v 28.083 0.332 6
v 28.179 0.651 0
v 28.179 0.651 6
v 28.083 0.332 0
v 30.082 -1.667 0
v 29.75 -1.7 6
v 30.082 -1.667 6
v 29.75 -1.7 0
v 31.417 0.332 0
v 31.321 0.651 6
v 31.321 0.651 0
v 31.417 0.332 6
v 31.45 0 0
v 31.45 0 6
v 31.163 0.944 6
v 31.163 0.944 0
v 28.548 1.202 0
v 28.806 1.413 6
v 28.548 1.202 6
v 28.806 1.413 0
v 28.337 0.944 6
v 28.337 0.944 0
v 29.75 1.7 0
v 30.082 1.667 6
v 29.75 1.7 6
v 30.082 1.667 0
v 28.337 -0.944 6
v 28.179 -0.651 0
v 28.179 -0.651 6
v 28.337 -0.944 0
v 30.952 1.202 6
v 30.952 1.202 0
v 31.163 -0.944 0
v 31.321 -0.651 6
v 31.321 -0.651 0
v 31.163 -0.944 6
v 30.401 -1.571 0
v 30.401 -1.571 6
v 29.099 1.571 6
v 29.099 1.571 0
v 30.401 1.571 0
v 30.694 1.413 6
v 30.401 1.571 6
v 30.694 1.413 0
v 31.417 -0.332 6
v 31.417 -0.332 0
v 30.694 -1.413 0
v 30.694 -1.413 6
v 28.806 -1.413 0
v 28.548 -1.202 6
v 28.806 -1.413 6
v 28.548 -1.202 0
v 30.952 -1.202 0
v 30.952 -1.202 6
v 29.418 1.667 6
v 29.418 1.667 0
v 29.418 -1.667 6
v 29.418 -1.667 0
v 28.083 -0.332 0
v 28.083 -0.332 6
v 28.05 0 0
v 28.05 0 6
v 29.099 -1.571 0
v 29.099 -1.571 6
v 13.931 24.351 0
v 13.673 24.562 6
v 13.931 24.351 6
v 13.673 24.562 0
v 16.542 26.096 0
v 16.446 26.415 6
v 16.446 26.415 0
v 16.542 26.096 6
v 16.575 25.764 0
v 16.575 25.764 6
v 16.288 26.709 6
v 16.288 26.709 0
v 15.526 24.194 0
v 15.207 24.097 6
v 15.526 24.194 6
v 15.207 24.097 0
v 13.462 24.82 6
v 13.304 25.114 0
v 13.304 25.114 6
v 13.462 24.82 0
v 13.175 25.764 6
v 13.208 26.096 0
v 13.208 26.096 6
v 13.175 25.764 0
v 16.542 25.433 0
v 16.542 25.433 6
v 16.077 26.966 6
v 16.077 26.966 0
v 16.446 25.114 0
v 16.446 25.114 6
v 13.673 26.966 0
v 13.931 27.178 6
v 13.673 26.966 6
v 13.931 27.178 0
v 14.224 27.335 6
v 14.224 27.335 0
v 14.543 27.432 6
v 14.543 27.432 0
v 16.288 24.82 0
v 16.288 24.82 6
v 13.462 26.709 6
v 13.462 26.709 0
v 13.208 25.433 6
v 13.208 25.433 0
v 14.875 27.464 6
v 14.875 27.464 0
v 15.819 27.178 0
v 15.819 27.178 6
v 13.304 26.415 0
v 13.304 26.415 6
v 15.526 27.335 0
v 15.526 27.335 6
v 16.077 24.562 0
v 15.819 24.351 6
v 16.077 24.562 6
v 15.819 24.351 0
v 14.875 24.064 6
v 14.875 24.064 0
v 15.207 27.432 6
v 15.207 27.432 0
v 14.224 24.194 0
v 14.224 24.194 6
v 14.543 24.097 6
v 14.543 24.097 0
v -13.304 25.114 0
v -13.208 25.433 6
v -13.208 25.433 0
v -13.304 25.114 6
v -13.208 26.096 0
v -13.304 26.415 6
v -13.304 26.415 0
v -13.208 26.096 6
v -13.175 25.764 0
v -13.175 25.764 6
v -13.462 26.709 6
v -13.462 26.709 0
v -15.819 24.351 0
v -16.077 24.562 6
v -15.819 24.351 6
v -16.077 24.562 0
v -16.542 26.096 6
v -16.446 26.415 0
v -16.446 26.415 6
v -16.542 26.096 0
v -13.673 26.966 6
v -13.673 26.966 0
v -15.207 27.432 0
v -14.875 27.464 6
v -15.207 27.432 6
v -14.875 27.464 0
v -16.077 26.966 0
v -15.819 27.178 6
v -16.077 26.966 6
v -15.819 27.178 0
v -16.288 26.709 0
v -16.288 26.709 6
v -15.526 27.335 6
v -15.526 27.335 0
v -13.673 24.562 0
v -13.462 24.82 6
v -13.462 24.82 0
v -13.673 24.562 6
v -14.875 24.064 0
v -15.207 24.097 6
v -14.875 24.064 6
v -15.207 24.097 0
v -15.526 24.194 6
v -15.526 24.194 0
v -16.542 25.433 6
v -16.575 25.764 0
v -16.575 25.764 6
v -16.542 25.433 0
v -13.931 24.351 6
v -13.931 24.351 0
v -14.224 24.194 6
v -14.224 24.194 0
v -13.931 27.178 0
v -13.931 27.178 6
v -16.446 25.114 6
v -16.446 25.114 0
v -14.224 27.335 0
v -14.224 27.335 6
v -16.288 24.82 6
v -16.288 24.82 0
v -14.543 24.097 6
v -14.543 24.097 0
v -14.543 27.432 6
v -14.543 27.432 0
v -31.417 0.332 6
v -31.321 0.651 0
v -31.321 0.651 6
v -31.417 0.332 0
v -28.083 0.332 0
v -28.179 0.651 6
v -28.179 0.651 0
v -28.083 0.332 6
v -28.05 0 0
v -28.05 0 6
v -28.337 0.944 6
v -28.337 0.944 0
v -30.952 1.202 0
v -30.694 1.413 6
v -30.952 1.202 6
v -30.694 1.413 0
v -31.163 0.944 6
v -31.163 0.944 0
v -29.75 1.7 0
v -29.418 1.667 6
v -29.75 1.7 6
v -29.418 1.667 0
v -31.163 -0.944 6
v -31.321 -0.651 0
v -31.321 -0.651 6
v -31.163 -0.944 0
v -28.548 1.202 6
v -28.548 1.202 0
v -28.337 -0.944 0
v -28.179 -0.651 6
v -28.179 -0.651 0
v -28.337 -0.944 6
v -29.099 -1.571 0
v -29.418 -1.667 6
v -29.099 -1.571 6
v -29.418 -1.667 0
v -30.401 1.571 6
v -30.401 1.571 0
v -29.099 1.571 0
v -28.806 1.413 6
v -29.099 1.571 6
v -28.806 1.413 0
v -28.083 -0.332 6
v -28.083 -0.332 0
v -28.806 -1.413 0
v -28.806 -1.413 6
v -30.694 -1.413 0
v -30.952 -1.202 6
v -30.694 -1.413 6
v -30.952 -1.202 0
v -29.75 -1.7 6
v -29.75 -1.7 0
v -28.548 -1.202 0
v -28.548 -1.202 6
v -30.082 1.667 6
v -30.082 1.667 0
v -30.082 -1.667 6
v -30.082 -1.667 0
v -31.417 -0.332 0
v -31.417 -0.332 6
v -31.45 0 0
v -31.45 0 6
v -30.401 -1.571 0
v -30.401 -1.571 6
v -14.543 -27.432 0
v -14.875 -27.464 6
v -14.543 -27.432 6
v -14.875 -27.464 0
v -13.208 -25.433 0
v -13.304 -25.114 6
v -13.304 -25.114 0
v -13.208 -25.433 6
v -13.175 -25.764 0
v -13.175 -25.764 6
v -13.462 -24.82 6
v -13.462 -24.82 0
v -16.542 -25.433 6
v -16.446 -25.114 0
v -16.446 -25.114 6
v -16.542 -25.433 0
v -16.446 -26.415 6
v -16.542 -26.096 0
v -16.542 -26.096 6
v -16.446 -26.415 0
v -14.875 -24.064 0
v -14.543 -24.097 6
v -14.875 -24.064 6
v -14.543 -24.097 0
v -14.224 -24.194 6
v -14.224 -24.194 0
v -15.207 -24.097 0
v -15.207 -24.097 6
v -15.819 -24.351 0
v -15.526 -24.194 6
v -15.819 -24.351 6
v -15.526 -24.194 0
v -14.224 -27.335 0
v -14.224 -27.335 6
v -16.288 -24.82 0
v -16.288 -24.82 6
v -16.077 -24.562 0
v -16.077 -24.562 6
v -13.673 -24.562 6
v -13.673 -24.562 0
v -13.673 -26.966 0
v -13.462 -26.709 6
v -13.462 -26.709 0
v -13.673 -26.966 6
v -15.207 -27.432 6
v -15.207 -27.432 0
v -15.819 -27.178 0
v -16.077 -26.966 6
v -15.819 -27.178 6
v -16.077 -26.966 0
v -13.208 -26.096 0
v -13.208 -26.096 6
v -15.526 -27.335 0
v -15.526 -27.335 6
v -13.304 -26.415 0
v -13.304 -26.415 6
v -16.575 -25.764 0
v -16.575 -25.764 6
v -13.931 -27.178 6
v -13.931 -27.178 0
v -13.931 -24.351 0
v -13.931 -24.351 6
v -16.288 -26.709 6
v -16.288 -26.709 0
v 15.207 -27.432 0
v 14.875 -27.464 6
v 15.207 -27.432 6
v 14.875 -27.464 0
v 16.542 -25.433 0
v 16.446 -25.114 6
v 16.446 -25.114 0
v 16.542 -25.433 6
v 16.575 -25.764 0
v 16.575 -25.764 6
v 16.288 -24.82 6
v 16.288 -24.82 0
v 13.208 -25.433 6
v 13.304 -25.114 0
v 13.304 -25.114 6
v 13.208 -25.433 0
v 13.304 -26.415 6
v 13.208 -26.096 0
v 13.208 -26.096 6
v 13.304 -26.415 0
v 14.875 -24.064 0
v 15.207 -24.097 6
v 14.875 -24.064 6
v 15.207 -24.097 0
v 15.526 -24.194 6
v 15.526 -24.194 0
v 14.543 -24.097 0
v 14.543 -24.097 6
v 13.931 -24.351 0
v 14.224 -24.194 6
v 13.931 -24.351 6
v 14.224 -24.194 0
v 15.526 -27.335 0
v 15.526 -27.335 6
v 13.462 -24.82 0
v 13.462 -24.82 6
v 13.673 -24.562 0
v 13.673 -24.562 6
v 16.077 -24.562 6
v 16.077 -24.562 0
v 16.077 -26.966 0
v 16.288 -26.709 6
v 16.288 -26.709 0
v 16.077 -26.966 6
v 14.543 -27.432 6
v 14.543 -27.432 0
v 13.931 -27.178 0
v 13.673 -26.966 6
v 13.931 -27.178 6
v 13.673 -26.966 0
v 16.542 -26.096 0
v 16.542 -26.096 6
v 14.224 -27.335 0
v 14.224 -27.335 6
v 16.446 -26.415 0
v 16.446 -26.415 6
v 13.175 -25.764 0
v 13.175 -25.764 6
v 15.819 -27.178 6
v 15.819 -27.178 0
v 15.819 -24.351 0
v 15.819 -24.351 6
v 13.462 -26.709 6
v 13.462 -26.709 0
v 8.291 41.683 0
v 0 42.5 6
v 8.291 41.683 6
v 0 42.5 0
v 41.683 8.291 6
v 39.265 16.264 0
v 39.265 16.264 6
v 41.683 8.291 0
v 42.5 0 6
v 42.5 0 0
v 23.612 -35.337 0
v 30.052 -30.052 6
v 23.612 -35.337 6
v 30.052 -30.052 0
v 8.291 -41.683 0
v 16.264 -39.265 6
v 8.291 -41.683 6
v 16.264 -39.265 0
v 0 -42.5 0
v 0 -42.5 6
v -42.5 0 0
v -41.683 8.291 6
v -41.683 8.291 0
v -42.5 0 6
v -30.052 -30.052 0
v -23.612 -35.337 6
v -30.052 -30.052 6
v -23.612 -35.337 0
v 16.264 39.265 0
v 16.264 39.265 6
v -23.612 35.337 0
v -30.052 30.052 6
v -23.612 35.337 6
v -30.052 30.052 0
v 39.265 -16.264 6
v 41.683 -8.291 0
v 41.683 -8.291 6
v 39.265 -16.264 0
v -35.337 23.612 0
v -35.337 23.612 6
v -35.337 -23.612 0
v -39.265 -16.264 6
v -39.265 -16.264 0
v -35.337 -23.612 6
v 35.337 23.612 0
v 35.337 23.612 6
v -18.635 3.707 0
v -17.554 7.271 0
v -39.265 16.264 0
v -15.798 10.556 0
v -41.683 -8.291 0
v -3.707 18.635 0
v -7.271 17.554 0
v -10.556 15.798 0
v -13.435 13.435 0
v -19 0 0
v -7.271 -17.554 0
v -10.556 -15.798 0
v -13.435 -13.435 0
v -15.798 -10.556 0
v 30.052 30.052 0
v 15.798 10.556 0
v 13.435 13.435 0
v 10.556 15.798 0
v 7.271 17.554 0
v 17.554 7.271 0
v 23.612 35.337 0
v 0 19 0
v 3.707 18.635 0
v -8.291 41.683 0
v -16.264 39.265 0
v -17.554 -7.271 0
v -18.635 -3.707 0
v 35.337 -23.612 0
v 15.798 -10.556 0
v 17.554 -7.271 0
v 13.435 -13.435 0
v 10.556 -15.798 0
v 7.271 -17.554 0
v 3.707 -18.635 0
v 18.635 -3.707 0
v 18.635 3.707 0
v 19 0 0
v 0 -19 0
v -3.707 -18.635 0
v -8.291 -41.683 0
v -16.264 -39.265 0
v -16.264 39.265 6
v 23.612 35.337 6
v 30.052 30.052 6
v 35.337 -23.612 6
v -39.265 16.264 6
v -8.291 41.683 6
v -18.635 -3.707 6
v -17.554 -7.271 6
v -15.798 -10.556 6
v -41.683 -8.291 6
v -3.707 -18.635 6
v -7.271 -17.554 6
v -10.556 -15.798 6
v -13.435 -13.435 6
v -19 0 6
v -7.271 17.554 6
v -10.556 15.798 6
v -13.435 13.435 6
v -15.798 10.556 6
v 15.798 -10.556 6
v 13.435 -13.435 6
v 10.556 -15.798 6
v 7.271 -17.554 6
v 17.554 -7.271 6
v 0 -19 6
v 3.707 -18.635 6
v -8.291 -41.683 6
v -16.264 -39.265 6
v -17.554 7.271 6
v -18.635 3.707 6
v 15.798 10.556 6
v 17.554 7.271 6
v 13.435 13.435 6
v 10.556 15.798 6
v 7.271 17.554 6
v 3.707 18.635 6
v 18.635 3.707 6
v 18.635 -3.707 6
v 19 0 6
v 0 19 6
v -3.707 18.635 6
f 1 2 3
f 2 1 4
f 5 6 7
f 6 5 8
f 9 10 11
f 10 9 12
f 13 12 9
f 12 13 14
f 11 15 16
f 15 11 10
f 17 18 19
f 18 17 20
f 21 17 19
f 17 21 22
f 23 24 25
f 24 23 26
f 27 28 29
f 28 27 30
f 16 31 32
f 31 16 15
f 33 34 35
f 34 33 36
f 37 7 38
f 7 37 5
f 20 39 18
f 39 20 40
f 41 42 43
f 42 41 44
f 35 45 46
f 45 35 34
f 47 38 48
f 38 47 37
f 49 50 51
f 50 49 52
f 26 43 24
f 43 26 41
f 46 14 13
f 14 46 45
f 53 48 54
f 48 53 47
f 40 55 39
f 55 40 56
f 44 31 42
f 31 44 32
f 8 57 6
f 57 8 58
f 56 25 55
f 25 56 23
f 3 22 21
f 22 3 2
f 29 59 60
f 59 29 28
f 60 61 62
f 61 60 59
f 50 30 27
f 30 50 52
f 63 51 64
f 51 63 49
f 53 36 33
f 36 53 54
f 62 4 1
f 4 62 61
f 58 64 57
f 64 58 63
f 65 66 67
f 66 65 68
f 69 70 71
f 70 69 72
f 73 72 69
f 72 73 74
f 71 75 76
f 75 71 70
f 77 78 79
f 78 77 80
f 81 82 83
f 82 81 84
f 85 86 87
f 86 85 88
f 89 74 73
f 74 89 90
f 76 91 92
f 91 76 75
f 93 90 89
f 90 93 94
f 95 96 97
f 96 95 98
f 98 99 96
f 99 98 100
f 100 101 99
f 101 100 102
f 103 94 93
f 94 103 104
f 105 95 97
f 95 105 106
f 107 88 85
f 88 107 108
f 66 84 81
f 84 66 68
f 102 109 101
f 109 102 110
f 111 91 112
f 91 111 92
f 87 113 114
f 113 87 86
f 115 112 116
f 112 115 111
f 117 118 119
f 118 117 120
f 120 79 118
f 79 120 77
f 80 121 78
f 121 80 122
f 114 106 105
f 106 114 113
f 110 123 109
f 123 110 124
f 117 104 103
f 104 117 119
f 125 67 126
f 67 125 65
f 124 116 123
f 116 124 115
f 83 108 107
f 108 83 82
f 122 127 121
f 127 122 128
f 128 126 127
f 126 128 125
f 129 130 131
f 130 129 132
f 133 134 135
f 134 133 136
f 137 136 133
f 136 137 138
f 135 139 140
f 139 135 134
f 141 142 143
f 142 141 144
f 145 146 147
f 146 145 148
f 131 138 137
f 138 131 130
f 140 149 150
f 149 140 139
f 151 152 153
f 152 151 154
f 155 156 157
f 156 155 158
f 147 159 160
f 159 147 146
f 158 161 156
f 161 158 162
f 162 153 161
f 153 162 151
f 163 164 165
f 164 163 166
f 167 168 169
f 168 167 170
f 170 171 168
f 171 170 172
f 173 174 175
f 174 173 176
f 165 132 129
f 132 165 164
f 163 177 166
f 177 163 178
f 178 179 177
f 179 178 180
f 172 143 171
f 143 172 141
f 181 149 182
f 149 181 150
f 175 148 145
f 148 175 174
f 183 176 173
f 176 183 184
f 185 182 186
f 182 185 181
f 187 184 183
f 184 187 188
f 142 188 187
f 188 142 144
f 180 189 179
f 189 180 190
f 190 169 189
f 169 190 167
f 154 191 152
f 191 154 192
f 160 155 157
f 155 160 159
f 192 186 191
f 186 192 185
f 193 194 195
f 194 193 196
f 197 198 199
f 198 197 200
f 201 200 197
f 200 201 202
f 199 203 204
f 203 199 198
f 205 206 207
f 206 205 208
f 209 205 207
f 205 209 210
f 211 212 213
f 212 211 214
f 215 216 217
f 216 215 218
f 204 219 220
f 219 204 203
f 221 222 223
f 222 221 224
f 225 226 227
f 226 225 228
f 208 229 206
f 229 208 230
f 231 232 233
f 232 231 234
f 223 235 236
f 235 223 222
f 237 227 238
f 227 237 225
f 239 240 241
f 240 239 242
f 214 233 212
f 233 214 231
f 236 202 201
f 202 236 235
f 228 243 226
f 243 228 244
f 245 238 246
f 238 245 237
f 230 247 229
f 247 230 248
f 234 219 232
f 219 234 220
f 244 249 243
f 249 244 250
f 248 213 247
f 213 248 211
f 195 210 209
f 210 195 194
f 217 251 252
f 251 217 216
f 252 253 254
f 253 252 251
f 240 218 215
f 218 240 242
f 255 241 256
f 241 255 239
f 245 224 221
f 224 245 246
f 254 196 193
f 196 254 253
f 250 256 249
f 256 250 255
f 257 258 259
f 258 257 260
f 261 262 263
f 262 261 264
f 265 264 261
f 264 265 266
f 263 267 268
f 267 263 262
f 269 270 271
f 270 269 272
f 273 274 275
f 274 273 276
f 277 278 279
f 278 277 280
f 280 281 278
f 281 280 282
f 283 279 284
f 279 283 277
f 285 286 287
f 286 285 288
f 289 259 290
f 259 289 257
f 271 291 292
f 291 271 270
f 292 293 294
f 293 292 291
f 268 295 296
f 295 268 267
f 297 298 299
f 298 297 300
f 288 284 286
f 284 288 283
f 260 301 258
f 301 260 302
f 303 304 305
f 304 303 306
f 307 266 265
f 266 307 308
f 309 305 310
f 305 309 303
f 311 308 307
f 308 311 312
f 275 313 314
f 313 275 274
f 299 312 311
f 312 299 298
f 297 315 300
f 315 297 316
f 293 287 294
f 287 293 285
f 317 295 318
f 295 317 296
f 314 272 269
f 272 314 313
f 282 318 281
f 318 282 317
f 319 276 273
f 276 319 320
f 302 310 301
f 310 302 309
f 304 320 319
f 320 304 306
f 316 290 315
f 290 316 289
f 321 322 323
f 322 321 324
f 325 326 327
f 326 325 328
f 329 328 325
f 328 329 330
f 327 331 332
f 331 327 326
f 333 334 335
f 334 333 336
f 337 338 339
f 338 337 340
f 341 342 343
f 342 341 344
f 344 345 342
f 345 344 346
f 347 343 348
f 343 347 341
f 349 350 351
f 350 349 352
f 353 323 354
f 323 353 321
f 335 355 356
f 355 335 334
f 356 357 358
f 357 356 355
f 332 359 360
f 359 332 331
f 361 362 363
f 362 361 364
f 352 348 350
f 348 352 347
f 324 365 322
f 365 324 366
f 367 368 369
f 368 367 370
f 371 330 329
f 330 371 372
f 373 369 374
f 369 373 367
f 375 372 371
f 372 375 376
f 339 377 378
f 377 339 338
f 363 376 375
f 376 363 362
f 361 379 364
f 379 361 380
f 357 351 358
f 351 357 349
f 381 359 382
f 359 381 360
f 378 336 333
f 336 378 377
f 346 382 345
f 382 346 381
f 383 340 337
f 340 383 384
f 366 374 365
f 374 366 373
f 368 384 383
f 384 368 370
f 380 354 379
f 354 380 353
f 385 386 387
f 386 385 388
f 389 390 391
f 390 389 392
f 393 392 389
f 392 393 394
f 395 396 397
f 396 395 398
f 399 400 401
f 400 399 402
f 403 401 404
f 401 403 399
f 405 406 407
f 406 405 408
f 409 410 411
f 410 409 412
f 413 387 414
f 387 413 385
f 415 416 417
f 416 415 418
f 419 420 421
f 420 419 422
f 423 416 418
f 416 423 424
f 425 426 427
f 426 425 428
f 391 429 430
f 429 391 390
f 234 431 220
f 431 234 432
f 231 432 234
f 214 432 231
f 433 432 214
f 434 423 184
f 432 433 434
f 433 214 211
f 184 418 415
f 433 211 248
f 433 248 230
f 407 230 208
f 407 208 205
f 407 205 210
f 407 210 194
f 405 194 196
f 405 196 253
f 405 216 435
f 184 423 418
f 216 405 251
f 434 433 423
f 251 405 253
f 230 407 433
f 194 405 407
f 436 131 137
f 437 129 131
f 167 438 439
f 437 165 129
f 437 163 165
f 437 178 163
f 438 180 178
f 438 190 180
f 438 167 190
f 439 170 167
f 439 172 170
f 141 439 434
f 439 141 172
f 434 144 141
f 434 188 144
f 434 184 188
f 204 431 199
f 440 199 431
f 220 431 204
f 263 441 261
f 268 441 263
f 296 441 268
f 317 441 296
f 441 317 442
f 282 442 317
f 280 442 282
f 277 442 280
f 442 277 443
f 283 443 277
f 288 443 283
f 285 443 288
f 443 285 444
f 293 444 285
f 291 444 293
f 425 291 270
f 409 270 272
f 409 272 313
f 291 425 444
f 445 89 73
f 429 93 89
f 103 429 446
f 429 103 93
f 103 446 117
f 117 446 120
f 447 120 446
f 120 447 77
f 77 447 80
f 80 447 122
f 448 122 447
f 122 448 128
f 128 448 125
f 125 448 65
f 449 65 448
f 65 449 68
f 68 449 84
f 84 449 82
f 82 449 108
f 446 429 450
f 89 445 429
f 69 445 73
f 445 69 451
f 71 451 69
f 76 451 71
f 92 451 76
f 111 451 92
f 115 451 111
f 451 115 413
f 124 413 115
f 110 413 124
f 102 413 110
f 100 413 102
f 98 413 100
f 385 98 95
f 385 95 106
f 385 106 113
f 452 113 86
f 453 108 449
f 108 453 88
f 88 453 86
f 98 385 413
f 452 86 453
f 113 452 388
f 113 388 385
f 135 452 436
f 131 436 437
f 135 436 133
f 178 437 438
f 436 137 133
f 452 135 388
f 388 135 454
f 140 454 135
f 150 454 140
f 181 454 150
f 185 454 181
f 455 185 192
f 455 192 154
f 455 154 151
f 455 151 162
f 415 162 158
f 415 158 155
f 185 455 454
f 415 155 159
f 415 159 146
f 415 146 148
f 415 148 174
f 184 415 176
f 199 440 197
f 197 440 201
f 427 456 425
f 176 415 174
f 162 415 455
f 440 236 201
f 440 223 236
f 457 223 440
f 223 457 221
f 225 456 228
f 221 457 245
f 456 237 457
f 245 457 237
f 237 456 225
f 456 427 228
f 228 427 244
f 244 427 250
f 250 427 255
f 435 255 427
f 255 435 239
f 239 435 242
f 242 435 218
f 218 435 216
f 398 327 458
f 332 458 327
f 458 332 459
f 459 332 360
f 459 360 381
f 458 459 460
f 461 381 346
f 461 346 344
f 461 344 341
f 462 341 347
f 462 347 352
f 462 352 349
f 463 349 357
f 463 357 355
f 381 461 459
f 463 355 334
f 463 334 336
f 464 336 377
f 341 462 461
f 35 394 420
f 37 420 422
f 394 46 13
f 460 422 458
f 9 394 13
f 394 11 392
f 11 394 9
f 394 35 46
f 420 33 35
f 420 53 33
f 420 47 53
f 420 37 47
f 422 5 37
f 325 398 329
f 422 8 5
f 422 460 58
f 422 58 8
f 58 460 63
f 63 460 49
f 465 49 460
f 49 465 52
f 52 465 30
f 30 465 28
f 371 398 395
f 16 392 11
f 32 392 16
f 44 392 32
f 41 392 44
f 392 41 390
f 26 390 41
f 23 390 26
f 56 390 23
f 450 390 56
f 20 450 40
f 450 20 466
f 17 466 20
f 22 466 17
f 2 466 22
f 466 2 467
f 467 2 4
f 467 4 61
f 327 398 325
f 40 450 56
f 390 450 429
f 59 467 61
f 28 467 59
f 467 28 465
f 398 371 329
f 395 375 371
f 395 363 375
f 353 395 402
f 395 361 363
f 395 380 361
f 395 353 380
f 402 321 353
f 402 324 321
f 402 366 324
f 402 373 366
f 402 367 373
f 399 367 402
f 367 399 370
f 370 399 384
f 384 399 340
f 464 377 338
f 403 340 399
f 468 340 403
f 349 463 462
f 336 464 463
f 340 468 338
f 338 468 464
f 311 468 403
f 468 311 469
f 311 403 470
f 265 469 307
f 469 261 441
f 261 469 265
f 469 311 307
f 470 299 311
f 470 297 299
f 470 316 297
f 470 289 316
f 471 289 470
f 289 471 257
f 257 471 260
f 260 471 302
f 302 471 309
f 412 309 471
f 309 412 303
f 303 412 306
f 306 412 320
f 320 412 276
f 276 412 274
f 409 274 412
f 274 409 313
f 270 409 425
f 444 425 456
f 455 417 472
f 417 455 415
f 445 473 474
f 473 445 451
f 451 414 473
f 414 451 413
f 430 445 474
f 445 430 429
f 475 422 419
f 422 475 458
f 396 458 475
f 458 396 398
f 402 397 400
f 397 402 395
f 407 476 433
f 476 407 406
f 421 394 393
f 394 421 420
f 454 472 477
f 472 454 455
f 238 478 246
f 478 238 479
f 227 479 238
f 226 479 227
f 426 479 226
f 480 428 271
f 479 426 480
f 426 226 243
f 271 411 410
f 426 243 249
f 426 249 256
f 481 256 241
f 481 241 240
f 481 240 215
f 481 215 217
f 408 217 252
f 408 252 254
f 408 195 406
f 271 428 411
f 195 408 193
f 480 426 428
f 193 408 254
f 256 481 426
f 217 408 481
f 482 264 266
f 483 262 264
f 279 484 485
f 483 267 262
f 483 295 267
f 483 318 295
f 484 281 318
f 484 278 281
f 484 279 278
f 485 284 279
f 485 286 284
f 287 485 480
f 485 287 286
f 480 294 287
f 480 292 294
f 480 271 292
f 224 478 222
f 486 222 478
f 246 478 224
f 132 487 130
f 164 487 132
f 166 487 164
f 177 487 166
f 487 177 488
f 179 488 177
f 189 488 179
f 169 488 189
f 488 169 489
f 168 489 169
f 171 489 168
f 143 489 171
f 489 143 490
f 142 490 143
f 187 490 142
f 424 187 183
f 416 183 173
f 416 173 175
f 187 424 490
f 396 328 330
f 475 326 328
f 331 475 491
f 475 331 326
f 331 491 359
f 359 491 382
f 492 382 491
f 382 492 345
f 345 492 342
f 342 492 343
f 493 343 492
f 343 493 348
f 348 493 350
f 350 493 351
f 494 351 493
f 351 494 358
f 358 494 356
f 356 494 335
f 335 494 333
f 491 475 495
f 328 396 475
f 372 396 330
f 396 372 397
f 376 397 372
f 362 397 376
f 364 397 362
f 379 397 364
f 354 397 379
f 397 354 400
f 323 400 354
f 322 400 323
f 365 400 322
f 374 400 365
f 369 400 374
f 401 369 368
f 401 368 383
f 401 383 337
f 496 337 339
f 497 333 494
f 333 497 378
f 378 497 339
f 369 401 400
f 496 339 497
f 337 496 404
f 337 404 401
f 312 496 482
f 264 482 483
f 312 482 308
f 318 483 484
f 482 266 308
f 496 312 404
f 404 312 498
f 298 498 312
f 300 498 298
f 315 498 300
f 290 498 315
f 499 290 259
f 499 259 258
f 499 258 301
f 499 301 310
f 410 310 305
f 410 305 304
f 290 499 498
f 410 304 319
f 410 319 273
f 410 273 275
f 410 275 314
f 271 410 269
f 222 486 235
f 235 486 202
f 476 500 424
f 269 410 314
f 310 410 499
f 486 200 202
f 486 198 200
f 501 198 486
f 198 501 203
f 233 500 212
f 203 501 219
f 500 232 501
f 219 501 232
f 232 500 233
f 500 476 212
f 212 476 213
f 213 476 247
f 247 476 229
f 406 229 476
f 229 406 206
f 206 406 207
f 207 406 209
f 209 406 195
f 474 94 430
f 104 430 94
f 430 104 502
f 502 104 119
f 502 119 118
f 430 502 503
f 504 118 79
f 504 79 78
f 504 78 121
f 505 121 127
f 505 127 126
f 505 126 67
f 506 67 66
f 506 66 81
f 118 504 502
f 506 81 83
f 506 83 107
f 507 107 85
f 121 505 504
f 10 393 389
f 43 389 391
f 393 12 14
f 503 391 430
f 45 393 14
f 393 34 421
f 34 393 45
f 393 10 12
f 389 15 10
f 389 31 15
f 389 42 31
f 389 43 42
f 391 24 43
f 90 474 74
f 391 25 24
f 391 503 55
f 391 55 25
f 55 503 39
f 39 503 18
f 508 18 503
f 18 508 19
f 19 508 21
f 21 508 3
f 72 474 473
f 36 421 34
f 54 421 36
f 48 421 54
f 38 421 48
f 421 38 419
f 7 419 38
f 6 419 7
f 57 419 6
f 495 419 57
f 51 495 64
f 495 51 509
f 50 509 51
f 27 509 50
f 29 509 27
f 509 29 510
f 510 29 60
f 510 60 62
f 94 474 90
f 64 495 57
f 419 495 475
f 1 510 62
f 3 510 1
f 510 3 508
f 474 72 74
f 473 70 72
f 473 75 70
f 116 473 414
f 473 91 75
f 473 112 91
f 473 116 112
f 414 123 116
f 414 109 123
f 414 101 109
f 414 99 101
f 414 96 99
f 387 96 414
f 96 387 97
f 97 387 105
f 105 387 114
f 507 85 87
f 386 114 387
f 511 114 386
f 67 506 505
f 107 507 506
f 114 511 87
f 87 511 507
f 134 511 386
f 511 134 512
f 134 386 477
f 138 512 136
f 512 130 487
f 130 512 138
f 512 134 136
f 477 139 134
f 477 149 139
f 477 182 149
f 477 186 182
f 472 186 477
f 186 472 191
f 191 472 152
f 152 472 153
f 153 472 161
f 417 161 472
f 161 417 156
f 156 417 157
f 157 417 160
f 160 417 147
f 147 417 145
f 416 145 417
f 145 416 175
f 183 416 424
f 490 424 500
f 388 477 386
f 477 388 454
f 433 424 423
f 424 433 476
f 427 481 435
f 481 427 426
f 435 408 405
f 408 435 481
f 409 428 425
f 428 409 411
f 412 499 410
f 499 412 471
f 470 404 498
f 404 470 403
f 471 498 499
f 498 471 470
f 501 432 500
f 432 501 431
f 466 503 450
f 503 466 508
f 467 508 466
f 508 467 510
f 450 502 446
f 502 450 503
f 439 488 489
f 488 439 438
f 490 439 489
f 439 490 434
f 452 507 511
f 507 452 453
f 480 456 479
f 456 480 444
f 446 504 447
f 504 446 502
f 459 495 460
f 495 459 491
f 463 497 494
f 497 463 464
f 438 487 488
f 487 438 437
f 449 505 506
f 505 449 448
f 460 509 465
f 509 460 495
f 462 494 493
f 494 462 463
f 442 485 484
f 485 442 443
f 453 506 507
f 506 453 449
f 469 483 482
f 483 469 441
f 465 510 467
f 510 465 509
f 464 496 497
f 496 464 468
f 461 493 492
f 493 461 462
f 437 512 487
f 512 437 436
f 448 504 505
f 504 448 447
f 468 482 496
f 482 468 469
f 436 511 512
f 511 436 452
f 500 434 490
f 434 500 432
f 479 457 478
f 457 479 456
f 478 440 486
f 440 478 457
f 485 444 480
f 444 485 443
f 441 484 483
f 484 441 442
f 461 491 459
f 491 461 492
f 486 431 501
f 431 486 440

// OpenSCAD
$fn = 32;

// ----------------------------------------------------------------------
// Flange Ø85 x 6
// 6 holes on a Ø59.5 bolt circle, bolted joints
// ----------------------------------------------------------------------

// --- parameters (mm) ---
flange_d = 85;    // outside diameter of the flange
seat_tol = 0.05;  // tolerance at the seating features
free_tol = 0.3;   // general tolerance on the free sizes
thickness = 6;    // flange thickness
holes = 6;        // number of bolt holes
pcd = 59.5;       // bolt circle diameter
start_deg = 0;    // angle of the first hole, from +X
hole_d = 3.4;     // bolt hole diameter
bore_d = 38;      // central through bore
hub_d = 46;       // hub outside diameter
hub_h = 0;        // hub height above the flange face (0 = no hub)

// --- derived feature positions (mm) ---
height = thickness + hub_h;  // = 6   overall height of the part
pcd_r = pcd / 2;             // = 29.75   bolt circle radius
hole_step = 360 / holes;     // = 60   angular pitch
feature_centers = [
  [pcd_r * cos(start_deg + 0 * hole_step), pcd_r * sin(start_deg + 0 * hole_step)],
  [pcd_r * cos(start_deg + 1 * hole_step), pcd_r * sin(start_deg + 1 * hole_step)],
  [pcd_r * cos(start_deg + 2 * hole_step), pcd_r * sin(start_deg + 2 * hole_step)],
  [pcd_r * cos(start_deg + 3 * hole_step), pcd_r * sin(start_deg + 3 * hole_step)],
  [pcd_r * cos(start_deg + 4 * hole_step), pcd_r * sin(start_deg + 4 * hole_step)],
  [pcd_r * cos(start_deg + 5 * hole_step), pcd_r * sin(start_deg + 5 * hole_step)]
];   // bolt hole centres on the pitch circle

// flange disc, every hole and the bore cut straight through
difference() {
  union() {
    cylinder(d = flange_d, h = thickness);
  }
  translate([0, 0, -1]) cylinder(d = bore_d, h = height + 2);  // bore, through
  for (centre = feature_centers)
    translate([centre[0], centre[1], -1]) cylinder(d = hole_d, h = thickness + 2);
}
